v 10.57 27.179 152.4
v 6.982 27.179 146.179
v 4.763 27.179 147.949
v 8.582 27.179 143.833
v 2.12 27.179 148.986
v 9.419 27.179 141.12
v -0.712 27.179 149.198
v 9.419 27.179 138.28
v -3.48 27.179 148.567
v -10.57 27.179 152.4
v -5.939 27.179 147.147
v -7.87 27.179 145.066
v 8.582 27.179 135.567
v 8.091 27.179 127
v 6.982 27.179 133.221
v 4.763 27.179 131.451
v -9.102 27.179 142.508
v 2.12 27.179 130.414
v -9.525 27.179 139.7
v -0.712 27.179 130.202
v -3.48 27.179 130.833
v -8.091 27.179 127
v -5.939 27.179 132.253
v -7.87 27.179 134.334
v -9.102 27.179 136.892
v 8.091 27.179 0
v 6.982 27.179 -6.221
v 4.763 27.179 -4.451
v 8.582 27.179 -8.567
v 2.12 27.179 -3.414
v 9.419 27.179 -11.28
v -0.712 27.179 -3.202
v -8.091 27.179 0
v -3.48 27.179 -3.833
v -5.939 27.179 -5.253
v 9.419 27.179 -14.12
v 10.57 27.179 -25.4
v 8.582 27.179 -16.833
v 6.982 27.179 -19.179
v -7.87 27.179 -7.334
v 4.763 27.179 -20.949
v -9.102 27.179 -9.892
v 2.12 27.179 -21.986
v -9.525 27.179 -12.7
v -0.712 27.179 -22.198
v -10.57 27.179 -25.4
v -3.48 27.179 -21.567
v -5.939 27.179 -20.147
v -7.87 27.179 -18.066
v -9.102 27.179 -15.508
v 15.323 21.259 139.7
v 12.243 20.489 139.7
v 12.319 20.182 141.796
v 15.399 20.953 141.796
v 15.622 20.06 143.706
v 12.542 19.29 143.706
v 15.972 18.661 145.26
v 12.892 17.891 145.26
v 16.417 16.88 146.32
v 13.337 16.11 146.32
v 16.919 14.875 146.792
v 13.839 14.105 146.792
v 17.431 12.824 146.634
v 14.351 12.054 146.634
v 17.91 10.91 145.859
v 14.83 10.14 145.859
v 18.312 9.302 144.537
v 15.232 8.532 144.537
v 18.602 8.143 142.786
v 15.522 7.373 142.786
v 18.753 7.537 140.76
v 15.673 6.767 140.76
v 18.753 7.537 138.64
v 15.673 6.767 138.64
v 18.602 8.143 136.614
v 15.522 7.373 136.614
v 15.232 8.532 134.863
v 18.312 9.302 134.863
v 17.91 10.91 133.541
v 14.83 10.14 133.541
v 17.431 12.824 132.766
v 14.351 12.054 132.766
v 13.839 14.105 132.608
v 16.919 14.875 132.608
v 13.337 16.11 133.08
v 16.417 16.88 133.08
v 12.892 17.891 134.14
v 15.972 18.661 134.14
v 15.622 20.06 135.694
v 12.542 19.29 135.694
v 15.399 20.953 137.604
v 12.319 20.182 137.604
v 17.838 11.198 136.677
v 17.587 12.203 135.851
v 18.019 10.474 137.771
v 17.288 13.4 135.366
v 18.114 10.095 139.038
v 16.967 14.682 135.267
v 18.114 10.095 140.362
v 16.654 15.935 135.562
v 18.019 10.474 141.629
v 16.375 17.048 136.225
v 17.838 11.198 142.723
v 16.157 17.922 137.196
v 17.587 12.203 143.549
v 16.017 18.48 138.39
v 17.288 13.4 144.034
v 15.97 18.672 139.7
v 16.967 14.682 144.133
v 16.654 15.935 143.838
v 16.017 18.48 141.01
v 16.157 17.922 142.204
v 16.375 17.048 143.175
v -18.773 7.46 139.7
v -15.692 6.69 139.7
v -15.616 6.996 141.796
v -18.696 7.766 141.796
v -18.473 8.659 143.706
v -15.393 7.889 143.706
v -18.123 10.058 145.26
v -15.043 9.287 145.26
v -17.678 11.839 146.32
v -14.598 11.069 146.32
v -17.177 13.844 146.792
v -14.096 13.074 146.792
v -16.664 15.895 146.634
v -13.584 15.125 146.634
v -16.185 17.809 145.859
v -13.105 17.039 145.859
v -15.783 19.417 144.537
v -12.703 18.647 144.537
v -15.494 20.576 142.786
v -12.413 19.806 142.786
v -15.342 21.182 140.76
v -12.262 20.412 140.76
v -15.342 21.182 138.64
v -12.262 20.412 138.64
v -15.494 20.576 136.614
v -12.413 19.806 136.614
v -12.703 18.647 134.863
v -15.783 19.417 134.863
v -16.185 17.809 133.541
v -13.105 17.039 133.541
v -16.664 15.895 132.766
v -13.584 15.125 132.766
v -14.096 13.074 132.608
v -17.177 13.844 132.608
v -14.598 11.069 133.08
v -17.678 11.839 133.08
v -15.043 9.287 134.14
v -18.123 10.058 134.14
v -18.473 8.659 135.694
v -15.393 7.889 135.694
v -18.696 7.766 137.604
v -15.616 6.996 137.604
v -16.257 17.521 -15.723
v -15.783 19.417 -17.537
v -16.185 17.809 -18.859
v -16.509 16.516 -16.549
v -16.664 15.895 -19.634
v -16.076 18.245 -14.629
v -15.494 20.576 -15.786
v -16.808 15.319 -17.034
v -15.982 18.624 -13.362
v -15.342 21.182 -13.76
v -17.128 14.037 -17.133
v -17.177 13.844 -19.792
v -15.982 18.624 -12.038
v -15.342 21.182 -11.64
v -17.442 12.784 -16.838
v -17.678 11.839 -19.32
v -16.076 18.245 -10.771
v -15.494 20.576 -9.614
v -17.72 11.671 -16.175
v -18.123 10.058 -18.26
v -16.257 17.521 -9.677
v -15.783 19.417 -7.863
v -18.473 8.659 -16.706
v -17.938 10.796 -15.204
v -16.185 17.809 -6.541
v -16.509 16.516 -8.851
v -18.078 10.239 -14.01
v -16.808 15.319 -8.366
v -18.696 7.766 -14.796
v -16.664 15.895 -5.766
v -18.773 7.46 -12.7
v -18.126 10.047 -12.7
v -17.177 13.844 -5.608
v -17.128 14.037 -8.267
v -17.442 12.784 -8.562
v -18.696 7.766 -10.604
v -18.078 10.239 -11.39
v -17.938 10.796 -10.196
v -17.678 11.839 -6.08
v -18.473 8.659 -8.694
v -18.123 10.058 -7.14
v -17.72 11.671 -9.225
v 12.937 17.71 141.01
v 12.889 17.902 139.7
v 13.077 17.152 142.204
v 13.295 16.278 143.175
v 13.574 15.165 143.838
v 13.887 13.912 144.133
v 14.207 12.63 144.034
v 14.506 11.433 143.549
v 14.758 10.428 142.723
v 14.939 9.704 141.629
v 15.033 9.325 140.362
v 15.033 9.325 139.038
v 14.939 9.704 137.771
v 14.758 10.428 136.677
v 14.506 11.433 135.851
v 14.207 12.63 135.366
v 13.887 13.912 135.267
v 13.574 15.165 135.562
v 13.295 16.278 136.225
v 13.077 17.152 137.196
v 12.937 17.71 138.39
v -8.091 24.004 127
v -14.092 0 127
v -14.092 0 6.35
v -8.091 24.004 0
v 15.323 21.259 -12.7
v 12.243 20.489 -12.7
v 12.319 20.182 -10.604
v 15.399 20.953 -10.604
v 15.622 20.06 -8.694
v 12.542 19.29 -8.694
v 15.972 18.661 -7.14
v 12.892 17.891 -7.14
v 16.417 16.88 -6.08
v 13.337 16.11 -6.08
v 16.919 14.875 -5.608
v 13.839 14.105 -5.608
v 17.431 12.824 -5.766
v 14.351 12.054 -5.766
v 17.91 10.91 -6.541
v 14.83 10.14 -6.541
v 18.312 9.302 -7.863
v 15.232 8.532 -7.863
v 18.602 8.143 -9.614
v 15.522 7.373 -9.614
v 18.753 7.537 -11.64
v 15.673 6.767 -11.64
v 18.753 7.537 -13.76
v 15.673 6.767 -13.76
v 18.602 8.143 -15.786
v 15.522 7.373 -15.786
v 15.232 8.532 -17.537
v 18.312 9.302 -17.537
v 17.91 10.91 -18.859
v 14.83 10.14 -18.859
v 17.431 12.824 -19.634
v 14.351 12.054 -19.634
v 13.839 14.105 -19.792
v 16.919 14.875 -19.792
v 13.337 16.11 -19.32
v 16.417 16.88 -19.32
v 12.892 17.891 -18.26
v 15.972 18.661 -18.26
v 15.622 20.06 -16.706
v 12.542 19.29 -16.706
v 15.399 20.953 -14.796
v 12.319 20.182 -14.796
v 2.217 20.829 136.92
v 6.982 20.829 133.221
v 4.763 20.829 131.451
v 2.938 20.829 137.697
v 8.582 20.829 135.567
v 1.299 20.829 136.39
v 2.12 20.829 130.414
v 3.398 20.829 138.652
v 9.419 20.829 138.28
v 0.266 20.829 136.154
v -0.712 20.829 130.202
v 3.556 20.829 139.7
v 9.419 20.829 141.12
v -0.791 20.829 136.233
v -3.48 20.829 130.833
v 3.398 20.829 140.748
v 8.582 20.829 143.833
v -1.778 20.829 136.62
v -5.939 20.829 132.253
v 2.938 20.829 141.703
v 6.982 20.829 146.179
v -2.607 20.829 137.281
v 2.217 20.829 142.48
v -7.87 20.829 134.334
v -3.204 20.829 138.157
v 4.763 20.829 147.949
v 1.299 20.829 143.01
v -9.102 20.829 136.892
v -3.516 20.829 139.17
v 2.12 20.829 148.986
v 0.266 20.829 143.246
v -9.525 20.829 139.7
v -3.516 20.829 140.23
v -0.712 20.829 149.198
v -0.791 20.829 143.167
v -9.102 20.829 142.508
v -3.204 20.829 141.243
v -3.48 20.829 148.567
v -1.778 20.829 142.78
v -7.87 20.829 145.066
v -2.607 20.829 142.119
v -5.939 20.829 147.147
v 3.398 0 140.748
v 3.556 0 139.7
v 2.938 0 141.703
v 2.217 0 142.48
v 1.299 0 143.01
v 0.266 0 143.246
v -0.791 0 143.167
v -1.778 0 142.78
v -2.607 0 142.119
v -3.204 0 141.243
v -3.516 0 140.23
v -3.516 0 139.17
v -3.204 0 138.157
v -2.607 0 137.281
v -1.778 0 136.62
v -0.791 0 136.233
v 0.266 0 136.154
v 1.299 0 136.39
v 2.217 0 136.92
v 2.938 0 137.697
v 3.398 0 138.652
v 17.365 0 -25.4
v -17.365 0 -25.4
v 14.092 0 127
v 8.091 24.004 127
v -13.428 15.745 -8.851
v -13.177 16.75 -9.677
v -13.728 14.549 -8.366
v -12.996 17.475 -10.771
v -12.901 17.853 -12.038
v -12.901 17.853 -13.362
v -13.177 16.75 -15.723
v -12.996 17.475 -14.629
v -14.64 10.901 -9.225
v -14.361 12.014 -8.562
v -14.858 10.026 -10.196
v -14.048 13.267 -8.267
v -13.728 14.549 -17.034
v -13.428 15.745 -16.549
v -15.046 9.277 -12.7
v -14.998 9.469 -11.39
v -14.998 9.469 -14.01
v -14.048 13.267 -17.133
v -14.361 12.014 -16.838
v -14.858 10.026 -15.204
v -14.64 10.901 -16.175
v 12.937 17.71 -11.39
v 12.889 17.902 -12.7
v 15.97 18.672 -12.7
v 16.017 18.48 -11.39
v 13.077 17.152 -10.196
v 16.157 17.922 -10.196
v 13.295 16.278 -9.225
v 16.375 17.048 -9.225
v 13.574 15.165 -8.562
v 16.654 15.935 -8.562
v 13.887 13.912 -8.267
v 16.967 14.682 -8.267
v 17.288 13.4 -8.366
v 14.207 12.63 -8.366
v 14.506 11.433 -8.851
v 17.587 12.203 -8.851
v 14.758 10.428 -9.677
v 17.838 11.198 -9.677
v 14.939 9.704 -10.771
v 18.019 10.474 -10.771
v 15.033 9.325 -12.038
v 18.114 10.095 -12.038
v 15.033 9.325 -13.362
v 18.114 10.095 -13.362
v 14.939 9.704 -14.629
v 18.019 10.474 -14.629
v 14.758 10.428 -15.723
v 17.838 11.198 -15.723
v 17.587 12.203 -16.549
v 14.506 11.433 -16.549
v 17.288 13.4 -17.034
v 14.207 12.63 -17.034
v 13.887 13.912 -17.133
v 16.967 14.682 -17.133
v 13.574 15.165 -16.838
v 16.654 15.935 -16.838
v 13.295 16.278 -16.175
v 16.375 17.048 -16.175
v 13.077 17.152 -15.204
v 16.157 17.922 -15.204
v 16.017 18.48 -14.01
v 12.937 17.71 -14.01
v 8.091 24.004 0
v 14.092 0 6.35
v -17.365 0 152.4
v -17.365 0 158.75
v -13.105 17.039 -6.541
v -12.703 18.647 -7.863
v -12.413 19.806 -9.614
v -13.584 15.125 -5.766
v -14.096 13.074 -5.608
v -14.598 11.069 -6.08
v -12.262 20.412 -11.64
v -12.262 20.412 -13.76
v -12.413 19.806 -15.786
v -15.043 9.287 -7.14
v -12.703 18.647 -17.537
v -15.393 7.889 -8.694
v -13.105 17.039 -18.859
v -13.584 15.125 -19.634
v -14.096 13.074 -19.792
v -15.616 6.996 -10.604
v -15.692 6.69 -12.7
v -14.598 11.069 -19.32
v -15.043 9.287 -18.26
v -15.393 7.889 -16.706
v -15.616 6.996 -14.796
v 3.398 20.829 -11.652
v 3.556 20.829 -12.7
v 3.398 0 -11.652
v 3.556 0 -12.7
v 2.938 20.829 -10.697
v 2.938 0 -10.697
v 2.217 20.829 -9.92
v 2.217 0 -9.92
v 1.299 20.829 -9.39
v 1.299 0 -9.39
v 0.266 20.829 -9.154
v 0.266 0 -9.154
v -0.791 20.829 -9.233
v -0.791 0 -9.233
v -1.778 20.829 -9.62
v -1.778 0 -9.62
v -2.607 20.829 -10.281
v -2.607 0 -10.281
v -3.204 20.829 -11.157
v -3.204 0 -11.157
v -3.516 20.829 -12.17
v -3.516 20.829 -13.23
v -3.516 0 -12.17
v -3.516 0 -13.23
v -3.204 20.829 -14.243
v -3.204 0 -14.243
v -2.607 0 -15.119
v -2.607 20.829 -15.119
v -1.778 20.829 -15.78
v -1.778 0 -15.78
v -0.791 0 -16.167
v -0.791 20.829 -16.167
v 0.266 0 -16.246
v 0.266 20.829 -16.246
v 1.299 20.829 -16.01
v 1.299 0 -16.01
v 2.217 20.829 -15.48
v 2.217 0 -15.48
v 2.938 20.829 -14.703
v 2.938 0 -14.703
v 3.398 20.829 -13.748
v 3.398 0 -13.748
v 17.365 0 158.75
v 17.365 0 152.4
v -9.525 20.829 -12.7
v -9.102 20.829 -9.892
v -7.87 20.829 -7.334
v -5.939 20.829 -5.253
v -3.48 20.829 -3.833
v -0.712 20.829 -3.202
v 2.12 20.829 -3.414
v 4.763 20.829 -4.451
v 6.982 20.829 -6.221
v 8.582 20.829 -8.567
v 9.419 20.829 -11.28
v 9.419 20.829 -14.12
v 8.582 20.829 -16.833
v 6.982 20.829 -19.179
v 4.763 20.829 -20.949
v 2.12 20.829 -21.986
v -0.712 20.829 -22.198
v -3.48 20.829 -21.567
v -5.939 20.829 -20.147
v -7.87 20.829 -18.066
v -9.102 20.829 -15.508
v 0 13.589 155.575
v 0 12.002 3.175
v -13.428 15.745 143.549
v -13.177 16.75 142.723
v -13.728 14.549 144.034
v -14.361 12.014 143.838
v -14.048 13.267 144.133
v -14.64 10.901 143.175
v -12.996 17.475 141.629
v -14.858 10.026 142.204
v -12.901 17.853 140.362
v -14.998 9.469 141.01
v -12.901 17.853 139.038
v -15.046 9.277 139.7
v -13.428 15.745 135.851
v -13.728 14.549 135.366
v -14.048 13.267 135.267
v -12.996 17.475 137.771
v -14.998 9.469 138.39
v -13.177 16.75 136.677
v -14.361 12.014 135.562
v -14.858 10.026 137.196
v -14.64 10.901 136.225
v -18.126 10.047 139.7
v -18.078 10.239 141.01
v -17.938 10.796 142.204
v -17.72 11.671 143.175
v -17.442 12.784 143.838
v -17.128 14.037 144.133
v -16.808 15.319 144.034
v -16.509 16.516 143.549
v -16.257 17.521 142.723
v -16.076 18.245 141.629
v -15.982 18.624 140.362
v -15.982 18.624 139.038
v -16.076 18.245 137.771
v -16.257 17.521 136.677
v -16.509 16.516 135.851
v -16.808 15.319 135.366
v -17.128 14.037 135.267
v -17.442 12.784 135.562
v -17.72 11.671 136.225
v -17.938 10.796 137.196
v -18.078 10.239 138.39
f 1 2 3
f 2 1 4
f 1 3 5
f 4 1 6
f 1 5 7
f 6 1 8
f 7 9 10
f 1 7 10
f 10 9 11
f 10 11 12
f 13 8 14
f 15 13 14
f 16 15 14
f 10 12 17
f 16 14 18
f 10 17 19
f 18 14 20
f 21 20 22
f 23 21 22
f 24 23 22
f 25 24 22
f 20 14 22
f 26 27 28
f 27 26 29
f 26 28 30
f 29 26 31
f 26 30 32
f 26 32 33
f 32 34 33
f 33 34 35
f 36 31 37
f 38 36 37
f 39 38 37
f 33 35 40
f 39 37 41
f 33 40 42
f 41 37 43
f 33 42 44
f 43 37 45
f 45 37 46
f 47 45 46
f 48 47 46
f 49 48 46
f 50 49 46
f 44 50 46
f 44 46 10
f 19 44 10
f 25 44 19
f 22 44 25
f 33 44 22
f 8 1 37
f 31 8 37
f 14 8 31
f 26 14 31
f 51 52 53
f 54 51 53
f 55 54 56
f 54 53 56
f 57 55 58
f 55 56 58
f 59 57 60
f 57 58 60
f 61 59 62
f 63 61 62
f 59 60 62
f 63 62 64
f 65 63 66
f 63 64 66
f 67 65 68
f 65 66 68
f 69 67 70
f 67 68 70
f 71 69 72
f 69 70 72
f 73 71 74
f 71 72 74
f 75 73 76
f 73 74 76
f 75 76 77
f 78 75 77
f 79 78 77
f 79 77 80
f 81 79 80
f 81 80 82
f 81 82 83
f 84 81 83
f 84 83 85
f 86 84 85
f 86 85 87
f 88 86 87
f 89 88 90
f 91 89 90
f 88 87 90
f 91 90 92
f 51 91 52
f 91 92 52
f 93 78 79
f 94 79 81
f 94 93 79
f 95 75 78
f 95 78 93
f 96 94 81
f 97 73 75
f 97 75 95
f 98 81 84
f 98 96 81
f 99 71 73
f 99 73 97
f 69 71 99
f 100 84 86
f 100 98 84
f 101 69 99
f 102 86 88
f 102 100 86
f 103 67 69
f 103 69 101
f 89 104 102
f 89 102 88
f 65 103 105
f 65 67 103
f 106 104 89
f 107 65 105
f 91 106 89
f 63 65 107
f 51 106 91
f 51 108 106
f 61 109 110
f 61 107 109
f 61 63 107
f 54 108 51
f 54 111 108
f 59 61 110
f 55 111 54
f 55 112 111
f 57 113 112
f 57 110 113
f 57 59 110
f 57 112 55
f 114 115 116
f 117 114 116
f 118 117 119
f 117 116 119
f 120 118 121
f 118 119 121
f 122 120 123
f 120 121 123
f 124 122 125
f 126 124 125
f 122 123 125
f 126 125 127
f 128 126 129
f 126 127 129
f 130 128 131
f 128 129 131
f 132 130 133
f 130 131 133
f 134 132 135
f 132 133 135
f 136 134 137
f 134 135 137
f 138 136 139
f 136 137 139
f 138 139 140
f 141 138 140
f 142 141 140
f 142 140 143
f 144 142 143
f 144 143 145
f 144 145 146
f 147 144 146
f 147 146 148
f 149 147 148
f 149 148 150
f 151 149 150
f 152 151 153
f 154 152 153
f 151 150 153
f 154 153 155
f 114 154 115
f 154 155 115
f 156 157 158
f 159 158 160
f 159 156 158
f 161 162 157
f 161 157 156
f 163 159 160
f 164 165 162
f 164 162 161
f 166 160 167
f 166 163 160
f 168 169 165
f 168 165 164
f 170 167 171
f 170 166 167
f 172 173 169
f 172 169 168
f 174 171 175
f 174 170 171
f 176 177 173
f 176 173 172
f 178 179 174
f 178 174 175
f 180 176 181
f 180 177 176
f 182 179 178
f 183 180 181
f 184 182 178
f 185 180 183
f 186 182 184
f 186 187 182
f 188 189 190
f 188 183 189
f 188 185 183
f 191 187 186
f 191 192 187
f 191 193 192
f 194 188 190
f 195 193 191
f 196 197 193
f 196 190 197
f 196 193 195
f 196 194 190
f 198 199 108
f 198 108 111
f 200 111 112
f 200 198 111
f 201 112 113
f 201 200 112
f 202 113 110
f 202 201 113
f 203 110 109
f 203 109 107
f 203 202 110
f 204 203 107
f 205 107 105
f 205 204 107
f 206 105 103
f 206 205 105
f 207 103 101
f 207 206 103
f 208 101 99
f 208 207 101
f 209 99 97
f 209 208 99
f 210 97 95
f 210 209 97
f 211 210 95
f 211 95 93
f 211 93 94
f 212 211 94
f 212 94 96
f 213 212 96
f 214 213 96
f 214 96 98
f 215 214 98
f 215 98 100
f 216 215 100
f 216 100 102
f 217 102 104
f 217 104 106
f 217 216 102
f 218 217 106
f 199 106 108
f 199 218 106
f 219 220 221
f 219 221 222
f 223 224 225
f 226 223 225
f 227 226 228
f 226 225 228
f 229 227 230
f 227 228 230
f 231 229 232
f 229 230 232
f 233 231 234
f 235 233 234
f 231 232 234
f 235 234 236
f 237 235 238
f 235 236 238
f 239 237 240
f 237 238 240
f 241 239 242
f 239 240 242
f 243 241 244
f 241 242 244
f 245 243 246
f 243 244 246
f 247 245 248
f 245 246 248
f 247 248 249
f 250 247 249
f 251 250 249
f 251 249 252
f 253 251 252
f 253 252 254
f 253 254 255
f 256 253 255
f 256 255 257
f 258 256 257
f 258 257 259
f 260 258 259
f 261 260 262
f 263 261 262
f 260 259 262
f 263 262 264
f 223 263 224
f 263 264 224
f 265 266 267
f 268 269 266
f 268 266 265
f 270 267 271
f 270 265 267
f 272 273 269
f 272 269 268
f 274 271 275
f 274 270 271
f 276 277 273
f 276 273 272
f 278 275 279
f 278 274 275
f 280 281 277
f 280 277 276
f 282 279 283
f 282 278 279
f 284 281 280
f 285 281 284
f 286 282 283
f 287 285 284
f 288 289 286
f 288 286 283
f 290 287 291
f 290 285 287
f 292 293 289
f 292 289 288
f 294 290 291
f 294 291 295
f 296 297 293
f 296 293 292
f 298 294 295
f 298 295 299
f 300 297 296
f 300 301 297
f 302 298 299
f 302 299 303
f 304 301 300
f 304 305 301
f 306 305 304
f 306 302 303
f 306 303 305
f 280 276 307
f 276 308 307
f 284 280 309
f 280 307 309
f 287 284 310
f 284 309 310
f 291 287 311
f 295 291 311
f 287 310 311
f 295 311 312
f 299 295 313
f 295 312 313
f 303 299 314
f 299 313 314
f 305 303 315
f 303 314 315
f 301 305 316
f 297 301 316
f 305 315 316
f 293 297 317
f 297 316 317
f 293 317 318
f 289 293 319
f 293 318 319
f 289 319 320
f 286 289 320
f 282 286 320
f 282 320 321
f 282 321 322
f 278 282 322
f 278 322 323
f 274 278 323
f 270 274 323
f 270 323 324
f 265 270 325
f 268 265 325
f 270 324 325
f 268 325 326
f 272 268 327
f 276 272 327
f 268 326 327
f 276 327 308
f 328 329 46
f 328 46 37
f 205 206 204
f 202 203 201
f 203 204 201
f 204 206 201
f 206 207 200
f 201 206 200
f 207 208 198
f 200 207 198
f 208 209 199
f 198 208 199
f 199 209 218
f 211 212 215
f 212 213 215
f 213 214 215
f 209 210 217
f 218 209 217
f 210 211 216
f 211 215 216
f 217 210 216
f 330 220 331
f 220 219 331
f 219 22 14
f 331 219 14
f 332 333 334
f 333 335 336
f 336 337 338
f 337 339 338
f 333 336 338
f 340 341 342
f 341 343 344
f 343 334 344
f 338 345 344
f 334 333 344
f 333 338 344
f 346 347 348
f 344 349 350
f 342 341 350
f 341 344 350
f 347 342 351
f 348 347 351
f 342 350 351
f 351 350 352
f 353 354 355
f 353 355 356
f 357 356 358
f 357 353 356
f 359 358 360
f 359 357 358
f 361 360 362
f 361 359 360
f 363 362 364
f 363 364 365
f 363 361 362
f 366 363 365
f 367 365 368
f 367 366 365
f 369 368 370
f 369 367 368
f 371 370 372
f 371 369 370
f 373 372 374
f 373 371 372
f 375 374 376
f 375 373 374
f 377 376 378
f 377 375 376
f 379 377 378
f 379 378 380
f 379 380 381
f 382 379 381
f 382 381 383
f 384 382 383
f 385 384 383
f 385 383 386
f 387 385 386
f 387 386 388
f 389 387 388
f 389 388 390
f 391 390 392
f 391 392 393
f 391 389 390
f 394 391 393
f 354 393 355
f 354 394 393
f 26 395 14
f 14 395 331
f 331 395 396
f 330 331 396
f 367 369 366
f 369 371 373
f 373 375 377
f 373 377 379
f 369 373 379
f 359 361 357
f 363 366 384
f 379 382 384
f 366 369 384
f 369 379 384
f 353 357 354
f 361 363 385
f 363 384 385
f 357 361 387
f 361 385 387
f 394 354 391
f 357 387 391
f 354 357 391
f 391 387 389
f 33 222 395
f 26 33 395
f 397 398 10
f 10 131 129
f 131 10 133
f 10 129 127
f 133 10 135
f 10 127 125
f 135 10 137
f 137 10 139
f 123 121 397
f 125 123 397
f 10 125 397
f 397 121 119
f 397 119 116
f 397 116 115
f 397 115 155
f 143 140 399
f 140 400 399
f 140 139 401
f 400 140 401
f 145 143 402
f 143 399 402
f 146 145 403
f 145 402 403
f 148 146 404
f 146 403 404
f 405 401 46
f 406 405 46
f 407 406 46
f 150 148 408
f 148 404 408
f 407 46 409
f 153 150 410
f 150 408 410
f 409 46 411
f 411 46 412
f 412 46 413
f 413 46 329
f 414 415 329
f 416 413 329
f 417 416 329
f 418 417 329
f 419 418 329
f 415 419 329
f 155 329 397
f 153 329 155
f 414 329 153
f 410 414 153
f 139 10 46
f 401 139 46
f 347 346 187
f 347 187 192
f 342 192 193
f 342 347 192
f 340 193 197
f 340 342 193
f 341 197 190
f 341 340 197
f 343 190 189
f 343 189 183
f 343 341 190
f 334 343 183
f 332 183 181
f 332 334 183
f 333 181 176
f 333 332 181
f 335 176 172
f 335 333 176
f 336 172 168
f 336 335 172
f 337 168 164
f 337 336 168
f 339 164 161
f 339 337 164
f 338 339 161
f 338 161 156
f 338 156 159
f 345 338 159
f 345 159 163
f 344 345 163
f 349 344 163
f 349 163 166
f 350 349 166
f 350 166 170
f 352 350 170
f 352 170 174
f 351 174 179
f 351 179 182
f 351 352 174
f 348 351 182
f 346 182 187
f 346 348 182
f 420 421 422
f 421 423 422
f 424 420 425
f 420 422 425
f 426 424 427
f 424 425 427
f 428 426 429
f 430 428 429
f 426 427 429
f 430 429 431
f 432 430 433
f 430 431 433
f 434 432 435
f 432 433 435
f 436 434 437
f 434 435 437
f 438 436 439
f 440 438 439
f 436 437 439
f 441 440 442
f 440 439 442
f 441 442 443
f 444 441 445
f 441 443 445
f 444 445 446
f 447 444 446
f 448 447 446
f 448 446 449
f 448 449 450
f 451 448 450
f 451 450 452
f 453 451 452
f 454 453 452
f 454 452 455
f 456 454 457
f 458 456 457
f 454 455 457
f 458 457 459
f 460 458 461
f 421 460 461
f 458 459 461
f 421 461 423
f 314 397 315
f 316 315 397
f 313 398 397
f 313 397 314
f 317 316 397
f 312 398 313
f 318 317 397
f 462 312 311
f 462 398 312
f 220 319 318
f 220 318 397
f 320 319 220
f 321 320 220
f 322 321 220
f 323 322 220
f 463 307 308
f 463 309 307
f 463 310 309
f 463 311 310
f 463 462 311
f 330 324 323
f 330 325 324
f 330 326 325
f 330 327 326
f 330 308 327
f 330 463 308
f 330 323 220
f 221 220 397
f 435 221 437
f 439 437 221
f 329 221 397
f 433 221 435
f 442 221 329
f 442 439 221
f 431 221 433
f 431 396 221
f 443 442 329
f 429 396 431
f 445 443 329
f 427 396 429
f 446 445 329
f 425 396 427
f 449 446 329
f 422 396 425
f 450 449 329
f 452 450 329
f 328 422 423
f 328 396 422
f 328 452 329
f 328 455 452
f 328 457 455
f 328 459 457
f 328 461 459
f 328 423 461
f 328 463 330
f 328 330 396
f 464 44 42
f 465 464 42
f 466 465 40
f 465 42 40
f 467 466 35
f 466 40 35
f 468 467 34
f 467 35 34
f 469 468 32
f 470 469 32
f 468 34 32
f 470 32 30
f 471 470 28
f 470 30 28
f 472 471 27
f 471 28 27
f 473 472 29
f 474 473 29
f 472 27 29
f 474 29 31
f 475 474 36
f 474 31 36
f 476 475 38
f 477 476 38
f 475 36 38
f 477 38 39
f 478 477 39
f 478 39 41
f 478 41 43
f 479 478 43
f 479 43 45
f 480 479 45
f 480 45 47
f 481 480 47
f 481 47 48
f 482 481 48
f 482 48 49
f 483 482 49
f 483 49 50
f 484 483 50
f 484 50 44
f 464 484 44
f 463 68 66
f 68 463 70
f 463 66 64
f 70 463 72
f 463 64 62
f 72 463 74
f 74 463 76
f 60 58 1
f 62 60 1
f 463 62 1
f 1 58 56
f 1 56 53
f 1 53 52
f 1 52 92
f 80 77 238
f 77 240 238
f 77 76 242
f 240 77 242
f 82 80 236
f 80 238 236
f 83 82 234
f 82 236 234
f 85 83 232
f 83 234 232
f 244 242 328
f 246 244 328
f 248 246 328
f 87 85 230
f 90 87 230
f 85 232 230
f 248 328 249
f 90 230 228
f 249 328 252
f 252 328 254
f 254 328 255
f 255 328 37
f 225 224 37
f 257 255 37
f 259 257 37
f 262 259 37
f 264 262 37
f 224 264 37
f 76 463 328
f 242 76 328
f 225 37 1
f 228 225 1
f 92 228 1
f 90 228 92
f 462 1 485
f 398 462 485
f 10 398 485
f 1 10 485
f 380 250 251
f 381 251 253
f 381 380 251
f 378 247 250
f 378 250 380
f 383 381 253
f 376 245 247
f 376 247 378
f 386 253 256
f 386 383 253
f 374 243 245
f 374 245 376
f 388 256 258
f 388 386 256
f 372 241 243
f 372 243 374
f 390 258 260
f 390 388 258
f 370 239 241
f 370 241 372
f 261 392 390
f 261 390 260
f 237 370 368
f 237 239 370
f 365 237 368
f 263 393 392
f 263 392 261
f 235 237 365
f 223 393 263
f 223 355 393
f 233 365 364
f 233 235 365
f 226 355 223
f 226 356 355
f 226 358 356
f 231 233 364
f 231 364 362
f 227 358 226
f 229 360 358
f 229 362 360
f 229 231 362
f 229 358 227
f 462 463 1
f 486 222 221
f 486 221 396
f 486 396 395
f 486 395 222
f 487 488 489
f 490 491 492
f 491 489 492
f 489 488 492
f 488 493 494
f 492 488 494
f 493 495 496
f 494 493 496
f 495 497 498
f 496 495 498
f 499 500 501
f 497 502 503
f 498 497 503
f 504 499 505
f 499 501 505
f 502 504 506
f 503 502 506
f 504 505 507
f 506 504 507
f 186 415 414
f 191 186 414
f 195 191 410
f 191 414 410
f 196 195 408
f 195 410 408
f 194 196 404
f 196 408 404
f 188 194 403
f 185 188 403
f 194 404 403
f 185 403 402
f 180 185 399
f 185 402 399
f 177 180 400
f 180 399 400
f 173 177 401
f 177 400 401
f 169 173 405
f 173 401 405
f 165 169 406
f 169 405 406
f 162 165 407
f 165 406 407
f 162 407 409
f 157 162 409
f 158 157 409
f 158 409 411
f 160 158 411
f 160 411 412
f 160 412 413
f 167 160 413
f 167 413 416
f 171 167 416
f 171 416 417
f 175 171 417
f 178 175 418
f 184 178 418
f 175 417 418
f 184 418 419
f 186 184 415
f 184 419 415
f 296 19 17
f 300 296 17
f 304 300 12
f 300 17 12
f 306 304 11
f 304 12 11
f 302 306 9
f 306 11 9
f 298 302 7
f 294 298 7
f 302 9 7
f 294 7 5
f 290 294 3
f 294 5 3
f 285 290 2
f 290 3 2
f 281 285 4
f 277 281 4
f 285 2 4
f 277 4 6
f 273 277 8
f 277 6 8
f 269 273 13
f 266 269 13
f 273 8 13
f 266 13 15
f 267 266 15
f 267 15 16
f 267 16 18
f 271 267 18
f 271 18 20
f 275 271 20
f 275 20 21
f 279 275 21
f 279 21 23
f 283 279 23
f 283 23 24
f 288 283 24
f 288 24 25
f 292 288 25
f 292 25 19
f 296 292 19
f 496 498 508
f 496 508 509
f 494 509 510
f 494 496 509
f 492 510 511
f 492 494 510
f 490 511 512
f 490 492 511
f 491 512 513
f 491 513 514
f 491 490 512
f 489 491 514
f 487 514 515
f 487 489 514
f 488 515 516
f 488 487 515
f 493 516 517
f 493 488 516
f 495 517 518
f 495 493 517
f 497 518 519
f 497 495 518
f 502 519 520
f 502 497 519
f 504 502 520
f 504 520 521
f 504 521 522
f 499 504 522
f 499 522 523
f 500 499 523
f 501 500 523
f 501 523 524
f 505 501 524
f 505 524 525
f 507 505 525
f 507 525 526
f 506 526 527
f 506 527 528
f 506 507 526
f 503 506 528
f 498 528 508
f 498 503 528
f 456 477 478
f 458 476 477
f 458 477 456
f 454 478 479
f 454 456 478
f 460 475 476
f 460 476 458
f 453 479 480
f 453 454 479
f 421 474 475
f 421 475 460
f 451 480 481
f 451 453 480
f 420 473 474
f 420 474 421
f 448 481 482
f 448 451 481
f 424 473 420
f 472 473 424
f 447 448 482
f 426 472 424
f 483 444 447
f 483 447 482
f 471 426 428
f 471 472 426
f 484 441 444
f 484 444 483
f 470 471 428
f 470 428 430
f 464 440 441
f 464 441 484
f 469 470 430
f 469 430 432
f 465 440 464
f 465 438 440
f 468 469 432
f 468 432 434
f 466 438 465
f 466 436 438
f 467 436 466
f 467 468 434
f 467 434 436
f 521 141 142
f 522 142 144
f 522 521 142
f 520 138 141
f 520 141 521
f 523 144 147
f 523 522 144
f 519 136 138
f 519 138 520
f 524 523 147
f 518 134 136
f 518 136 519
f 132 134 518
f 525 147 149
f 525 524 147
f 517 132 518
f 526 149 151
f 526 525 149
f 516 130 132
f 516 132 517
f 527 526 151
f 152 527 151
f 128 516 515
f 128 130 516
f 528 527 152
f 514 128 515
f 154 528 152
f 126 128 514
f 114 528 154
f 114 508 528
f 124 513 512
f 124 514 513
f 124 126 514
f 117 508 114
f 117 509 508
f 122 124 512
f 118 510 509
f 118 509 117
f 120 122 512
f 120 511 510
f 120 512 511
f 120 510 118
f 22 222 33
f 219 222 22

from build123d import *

# Parameters (mm, degrees)
F1_DEPTH        = 127
F3_DEPTH        = 25.4
F5_DEPTH        = 25.4
F12_DEPTH       = 3.1760001
F14_D           = 7.112
F14_CBORE_D     = 19.05
F14_CBORE_DEPTH = 6.35
F15_R           = 7.112
F15_R_2         = 4.445
F16_DEPTH       = 3.175
F17_R           = 7.112
F17_R_2         = 4.445
F18_DEPTH       = 3.175


with BuildPart() as f1:
    # F0 (on Top) → F1 (new body)
    with BuildSketch(Plane.XY):
        Polygon((-10.5701125115, 27.1786895925), (-17.3647849097, 0), (-14.0920698193, 0), (-8.0911474212, 24.0036895925), (8.0911474212, 24.0036895925), (14.0920698193, 0), (17.3647849097, 0), (10.5701125115, 27.1786895925), align=None)
    extrude(amount=F1_DEPTH)

    # F2 (on face) → F3 (join)
    with BuildSketch(Plane(origin=(0, 0, 0), x_dir=(1, 0, 0), z_dir=(0, 0, -1))):
        Polygon((8.0911474212, -24.0036895925), (14.0920698193, 0), (-14.0920698193, 0), (-8.0911474212, -24.0036895925), align=None)
        Polygon((17.3647849097, 0), (14.0920698193, 0), (8.0911474212, -24.0036895925), (-8.0911474212, -24.0036895925), (-14.0920698193, 0), (-17.3647849097, 0), (-10.5701125115, -27.1786895925), (10.5701125115, -27.1786895925), align=None)
    extrude(amount=F3_DEPTH)

    # F4 (on face) → F5 (join)
    with BuildSketch(Plane.XY.offset(127)):
        Polygon((-8.0911474212, 24.0036895925), (-14.0920698193, 0), (14.0920698193, 0), (8.0911474212, 24.0036895925), align=None)
        Polygon((-17.3647849097, 0), (-14.0920698193, 0), (-8.0911474212, 24.0036895925), (8.0911474212, 24.0036895925), (14.0920698193, 0), (17.3647849097, 0), (10.5701125115, 27.1786895925), (-10.5701125115, 27.1786895925), align=None)
    extrude(amount=F5_DEPTH)

    # F6 (on face) → F8 section 0
    with BuildSketch(Plane(origin=(16.3433269738, 4.0858317435, 0), x_dir=(-0.242535625, 0.9701425001, 0), z_dir=(0.9701425001, 0.242535625, 0))):
        Polygon((-4.2115789617, 158.75), (-4.2115789617, 152.4), (23.8035730273, 152.4), align=None)
    # F7 (on face) → F8 section 1
    with BuildSketch(Plane(origin=(-16.3433269738, 4.0858317435, 0), x_dir=(-0.242535625, -0.9701425001, 0), z_dir=(-0.9701425001, 0.242535625, 0))):
        Polygon((-23.8035730273, 152.4), (4.2115789617, 152.4), (4.2115789617, 158.75), align=None)
    loft()

    # F10 (on face) → F11 section 0
    with BuildSketch(Plane(origin=(-13.2631245358, 3.315781134, 0), x_dir=(0.242535625, 0.9701425001, 0), z_dir=(0.9701425001, -0.242535625, 0))):
        Polygon((-3.4178289617, 6.35), (-3.4178289617, 0), (21.324607937, 0), align=None)
    # F9 (on face) → F11 section 1
    with BuildSketch(Plane(origin=(13.2631245358, 3.315781134, 0), x_dir=(0.242535625, -0.9701425001, 0), z_dir=(-0.9701425001, -0.242535625, 0))):
        Polygon((-21.324607937, 0), (3.4178289617, 0), (3.4178289617, 6.35), align=None)
    loft()

    # F12 (cut, through all): a face of the model
    f12_faces = [f1.faces().sort_by_distance(p)[0] for p in [
        (0, 24.0036895925, 63.5),
    ]]
    extrude(f12_faces, amount=-F12_DEPTH, mode=Mode.SUBTRACT)

    # F14 (through all)
    with Locations(Plane(origin=(0, 27.1786895925, 0), x_dir=(-1, 0, 0), z_dir=(0, 1, 0))):
        with Locations((0, 139.7), (0, -12.7)):
            CounterBoreHole(F14_D / 2, F14_CBORE_D / 2, F14_CBORE_DEPTH)

    # F15 (on face) → F16 (join)
    with BuildSketch(Plane(origin=(16.3433269738, 4.0858317435, 0), x_dir=(-0.242535625, 0.9701425001, 0), z_dir=(0.9701425001, 0.242535625, 0))):
        with Locations((9.7959970328, 139.7)):
            Circle(F15_R)
        with Locations((9.7959970328, 139.7)):
            Circle(F15_R_2, mode=Mode.SUBTRACT)
        with Locations((9.7959970328, -12.7)):
            Circle(F15_R)
        with Locations((9.7959970328, -12.7)):
            Circle(F15_R_2, mode=Mode.SUBTRACT)
    extrude(amount=F16_DEPTH)

    # F17 (on face) → F18 (join)
    with BuildSketch(Plane(origin=(-16.3433269738, 4.0858317435, 0), x_dir=(-0.242535625, -0.9701425001, 0), z_dir=(-0.9701425001, 0.242535625, 0))):
        with Locations((-9.7959970328, 139.7)):
            Circle(F17_R)
        with Locations((-9.7959970328, 139.7)):
            Circle(F17_R_2, mode=Mode.SUBTRACT)
        with Locations((-9.7959970328, -12.7)):
            Circle(F17_R)
        with Locations((-9.7959970328, -12.7)):
            Circle(F17_R_2, mode=Mode.SUBTRACT)
    extrude(amount=F18_DEPTH)


solid = f1.part
